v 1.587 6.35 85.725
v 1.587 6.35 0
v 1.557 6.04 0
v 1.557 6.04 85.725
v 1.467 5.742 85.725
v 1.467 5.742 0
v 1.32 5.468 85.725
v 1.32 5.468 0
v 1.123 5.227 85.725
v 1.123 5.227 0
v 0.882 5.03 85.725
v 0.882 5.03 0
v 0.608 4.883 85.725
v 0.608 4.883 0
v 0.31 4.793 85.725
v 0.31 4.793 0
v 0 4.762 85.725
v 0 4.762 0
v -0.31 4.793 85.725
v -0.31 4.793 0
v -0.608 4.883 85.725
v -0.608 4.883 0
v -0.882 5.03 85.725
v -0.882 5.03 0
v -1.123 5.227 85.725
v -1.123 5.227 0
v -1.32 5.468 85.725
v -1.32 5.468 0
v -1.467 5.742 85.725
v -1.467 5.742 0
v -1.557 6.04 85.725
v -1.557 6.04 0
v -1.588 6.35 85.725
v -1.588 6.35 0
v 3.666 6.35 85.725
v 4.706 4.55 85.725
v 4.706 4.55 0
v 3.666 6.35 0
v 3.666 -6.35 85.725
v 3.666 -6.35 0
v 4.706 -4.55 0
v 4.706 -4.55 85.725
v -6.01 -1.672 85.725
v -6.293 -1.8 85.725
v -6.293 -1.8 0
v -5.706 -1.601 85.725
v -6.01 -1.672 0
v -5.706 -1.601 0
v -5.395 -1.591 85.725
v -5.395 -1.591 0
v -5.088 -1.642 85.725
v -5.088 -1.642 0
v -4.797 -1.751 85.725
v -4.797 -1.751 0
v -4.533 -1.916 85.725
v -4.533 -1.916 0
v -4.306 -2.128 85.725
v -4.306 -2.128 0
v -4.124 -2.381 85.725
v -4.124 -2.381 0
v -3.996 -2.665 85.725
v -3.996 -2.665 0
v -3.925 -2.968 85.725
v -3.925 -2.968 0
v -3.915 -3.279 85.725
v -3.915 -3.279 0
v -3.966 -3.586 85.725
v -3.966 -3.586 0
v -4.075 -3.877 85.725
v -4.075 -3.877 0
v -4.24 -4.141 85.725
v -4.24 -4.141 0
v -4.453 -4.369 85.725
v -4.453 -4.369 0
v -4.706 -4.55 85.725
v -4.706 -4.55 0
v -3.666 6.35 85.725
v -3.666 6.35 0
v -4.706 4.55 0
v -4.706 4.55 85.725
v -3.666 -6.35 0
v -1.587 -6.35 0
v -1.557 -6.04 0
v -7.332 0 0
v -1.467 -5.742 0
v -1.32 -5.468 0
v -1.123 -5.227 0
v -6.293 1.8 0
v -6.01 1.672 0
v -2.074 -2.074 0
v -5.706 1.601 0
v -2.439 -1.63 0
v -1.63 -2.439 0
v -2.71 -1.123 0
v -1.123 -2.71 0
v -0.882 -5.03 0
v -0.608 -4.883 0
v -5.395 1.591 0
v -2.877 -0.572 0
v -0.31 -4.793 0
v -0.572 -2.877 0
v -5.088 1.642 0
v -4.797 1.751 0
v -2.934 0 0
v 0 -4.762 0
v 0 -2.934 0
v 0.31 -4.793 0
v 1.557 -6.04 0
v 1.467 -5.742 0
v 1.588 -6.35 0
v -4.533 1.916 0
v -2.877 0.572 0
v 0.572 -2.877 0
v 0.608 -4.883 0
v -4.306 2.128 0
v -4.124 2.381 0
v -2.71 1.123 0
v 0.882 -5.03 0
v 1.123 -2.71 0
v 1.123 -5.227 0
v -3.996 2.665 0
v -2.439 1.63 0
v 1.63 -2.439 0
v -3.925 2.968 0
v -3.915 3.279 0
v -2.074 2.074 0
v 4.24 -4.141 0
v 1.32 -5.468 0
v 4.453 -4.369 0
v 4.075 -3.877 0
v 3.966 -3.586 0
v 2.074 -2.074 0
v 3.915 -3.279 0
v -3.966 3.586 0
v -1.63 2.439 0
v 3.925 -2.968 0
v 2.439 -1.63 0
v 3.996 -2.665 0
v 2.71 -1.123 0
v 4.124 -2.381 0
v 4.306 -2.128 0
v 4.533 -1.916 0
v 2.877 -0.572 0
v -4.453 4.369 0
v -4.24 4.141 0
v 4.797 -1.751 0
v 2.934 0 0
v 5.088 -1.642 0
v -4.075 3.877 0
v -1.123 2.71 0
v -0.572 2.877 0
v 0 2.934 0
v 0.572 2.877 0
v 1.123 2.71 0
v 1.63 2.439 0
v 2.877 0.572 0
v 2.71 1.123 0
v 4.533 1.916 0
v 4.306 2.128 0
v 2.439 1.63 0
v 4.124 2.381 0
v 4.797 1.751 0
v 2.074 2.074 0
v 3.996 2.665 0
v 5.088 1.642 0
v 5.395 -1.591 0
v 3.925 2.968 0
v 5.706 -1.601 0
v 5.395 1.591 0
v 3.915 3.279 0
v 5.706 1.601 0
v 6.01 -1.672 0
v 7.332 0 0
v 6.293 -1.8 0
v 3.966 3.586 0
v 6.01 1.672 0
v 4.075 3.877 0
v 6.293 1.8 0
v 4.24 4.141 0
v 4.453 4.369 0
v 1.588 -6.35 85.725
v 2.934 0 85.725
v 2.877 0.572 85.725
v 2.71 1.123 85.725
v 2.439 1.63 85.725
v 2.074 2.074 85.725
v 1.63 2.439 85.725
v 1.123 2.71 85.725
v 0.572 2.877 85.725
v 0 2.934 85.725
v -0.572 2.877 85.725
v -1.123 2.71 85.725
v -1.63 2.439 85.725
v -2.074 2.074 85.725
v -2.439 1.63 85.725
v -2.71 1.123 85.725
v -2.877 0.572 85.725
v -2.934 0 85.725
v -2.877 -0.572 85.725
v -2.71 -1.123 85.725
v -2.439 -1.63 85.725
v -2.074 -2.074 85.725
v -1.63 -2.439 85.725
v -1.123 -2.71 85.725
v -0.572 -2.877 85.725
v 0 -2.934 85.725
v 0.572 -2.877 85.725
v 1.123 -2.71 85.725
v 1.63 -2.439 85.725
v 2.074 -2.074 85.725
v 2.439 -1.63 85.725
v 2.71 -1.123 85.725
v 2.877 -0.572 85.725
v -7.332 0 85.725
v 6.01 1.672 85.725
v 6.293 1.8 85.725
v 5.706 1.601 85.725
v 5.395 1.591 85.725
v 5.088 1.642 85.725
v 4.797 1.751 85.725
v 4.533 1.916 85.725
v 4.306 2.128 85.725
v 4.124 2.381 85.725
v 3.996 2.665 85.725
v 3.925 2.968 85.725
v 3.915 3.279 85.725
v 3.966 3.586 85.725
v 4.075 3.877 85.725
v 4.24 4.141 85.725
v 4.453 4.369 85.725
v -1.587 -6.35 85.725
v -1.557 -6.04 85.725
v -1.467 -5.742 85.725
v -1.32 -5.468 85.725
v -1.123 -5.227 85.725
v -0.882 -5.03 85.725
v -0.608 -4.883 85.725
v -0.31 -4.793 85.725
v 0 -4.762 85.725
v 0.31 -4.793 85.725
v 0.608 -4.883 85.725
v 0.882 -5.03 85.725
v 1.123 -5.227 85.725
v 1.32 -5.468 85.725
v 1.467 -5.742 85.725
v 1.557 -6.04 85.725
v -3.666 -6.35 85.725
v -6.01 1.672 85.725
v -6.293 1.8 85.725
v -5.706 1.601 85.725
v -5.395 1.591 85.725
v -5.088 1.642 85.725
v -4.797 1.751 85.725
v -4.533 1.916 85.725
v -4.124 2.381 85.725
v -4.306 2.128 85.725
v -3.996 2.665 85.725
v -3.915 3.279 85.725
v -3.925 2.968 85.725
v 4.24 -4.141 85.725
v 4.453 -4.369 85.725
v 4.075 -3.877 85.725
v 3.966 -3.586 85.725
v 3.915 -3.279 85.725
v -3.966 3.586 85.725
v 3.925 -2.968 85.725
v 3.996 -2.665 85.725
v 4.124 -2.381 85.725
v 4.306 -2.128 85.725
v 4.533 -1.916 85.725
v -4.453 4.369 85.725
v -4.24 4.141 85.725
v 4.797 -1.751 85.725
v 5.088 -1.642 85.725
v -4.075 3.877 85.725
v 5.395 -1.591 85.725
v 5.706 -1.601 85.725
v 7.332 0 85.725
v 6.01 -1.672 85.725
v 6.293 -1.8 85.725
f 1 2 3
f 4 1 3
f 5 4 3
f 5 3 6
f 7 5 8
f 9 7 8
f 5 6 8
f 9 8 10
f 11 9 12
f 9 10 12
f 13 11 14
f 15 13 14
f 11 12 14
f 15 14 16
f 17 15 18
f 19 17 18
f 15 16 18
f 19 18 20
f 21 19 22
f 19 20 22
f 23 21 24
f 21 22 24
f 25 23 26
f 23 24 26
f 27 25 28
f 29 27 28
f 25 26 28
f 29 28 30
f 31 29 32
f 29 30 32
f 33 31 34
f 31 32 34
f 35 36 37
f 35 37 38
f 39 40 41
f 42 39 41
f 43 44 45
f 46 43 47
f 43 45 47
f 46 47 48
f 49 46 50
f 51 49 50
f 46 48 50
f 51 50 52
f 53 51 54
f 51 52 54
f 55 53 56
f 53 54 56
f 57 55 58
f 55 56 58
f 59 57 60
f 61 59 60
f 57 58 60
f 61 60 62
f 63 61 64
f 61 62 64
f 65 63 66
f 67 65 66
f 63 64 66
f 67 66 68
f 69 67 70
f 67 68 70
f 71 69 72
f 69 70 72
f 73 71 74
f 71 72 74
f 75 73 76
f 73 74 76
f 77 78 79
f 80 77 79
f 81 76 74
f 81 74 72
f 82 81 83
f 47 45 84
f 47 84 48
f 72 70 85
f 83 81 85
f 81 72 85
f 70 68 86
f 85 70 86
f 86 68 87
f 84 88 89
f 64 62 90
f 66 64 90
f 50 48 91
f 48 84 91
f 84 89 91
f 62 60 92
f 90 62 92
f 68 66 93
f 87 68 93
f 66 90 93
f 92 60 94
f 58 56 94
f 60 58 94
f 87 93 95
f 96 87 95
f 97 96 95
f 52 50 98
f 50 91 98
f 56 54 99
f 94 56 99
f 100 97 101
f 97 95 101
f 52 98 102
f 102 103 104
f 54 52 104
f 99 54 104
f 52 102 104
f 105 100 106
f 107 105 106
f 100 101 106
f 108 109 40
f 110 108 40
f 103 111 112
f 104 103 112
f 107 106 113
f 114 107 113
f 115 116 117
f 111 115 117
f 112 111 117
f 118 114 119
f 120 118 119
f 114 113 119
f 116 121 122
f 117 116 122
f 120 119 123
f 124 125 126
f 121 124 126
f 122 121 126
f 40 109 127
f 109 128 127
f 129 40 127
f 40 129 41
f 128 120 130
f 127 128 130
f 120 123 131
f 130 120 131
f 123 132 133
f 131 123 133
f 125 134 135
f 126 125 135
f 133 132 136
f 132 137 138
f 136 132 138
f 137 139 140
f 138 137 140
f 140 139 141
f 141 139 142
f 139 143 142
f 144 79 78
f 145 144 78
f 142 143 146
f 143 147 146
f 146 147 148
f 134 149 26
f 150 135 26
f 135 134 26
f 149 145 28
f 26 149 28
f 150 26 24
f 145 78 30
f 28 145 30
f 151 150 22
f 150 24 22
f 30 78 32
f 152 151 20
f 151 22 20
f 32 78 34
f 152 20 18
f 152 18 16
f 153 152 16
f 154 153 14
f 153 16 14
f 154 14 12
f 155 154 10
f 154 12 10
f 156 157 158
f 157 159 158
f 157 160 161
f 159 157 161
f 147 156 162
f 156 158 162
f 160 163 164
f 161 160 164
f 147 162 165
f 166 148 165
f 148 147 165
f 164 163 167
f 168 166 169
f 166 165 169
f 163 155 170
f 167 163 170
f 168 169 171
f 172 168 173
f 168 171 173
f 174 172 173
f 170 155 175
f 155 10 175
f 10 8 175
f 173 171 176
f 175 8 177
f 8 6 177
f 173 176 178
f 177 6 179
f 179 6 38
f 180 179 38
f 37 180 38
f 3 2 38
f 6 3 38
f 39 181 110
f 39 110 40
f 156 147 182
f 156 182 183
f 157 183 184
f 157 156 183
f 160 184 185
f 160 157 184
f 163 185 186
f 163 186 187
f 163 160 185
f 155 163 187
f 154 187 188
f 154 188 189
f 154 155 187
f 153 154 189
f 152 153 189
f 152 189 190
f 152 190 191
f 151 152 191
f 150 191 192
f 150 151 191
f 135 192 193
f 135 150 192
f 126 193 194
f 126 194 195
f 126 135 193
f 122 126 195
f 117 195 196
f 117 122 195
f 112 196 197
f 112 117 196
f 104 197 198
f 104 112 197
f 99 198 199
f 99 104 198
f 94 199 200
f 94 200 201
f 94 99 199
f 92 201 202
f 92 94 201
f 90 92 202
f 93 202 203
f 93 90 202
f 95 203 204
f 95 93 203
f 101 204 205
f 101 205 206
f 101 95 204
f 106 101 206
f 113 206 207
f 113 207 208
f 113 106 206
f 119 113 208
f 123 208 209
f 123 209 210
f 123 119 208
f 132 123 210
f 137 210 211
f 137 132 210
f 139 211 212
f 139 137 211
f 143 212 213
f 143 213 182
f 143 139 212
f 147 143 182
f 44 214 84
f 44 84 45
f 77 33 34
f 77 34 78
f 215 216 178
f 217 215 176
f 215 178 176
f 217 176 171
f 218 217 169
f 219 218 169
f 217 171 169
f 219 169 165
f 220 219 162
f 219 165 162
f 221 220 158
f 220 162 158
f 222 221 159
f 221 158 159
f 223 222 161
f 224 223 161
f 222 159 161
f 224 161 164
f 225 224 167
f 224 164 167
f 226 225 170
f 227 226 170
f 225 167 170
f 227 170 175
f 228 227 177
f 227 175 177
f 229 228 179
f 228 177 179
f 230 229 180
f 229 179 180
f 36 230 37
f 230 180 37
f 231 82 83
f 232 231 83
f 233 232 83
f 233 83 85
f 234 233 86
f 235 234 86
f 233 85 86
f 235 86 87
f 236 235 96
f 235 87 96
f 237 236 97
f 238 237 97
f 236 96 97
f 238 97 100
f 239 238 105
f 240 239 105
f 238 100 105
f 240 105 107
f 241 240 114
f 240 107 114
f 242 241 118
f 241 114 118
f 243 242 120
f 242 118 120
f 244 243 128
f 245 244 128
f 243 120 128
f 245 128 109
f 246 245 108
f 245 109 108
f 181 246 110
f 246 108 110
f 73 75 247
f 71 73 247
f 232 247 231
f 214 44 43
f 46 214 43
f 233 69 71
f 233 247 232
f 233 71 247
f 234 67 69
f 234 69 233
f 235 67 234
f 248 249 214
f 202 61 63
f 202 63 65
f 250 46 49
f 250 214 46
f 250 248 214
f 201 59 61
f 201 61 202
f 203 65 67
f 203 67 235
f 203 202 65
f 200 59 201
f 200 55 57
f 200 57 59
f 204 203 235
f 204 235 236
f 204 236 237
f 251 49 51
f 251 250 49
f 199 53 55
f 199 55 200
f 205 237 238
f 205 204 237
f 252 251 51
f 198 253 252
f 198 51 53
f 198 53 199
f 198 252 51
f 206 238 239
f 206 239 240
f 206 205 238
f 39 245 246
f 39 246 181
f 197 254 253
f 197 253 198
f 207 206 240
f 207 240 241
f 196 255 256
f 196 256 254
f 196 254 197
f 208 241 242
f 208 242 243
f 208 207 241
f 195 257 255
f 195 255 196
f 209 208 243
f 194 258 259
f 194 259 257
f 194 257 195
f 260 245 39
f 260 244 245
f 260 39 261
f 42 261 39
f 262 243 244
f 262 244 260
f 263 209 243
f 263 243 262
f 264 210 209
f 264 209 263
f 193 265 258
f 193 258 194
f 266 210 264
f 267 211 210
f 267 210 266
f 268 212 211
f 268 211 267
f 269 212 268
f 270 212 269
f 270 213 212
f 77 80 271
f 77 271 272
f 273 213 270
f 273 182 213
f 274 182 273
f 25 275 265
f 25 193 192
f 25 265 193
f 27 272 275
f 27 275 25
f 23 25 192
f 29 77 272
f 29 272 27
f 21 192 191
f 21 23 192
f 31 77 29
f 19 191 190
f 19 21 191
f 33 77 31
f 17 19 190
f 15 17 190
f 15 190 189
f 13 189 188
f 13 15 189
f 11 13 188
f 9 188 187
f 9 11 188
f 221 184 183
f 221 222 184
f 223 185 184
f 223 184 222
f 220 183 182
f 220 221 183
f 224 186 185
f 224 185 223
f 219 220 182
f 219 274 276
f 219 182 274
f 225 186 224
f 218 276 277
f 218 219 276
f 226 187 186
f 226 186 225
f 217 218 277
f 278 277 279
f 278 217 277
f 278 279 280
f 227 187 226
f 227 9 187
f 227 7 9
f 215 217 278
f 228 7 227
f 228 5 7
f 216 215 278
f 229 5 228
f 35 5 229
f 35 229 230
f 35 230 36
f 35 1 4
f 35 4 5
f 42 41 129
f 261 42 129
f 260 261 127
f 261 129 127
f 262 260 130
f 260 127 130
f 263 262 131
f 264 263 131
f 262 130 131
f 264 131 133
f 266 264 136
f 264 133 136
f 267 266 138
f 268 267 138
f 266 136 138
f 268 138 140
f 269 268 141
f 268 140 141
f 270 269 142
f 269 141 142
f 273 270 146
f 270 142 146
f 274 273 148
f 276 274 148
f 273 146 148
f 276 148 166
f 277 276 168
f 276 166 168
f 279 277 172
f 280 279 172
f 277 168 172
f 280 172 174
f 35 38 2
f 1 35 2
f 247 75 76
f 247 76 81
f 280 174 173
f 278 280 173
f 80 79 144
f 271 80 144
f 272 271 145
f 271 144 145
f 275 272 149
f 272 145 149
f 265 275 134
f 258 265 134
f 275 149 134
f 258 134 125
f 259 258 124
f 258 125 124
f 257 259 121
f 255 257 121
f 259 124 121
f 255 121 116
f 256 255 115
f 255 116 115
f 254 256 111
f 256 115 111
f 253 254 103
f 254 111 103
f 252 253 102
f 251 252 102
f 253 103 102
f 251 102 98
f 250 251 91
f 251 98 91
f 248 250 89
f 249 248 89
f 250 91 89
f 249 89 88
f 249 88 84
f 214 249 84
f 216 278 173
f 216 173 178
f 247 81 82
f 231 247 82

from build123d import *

# Parameters (mm, degrees)
SKETCH1_R           = 2.9337
BOSS_EXTRUDE1_DEPTH = 85.725


with BuildPart() as part:
    # Sketch1 → Boss-Extrude1 (new body)
    with BuildSketch(Plane.XY):
        with BuildLine():
            Line((-1.587500385, 6.349999904), (-3.666174594, 6.349999778))
            Line((-3.666174594, 6.349999778), (-4.70551159, 4.549815043))
            ThreePointArc((-4.70551159, 4.549815043), (-4.12444613, 2.38124975), (-6.293011423, 1.80018429))
            Line((-6.293011423, 1.80018429), (-7.332348419, -4.44e-07))
            Line((-7.332348419, -4.44e-07), (-6.293011205, -1.800185053))
            ThreePointArc((-6.293011205, -1.800185053), (-4.124445841, -2.38125025), (-4.705511038, -4.549815614))
            Line((-4.705511038, -4.549815614), (-3.666173825, -6.350000222))
            Line((-3.666173825, -6.350000222), (-1.587499615, -6.350000096))
            ThreePointArc((-1.587499615, -6.350000096), (2.89e-07, -4.7625), (1.587500385, -6.349999904))
            Line((1.587500385, -6.349999904), (3.666174594, -6.349999778))
            Line((3.666174594, -6.349999778), (4.70551159, -4.549815043))
            ThreePointArc((4.70551159, -4.549815043), (4.12444613, -2.38124975), (6.293011423, -1.80018429))
            Line((6.293011423, -1.80018429), (7.332348419, 4.44e-07))
            Line((7.332348419, 4.44e-07), (6.293011205, 1.800185053))
            ThreePointArc((6.293011205, 1.800185053), (4.124445841, 2.38125025), (4.705511038, 4.549815614))
            Line((4.705511038, 4.549815614), (3.666173825, 6.350000222))
            Line((3.666173825, 6.350000222), (1.587499615, 6.350000096))
            ThreePointArc((1.587499615, 6.350000096), (-2.89e-07, 4.7625), (-1.587500385, 6.349999904))
        make_face()
        Circle(SKETCH1_R, mode=Mode.SUBTRACT)
    extrude(amount=BOSS_EXTRUDE1_DEPTH)


solid = part.part
